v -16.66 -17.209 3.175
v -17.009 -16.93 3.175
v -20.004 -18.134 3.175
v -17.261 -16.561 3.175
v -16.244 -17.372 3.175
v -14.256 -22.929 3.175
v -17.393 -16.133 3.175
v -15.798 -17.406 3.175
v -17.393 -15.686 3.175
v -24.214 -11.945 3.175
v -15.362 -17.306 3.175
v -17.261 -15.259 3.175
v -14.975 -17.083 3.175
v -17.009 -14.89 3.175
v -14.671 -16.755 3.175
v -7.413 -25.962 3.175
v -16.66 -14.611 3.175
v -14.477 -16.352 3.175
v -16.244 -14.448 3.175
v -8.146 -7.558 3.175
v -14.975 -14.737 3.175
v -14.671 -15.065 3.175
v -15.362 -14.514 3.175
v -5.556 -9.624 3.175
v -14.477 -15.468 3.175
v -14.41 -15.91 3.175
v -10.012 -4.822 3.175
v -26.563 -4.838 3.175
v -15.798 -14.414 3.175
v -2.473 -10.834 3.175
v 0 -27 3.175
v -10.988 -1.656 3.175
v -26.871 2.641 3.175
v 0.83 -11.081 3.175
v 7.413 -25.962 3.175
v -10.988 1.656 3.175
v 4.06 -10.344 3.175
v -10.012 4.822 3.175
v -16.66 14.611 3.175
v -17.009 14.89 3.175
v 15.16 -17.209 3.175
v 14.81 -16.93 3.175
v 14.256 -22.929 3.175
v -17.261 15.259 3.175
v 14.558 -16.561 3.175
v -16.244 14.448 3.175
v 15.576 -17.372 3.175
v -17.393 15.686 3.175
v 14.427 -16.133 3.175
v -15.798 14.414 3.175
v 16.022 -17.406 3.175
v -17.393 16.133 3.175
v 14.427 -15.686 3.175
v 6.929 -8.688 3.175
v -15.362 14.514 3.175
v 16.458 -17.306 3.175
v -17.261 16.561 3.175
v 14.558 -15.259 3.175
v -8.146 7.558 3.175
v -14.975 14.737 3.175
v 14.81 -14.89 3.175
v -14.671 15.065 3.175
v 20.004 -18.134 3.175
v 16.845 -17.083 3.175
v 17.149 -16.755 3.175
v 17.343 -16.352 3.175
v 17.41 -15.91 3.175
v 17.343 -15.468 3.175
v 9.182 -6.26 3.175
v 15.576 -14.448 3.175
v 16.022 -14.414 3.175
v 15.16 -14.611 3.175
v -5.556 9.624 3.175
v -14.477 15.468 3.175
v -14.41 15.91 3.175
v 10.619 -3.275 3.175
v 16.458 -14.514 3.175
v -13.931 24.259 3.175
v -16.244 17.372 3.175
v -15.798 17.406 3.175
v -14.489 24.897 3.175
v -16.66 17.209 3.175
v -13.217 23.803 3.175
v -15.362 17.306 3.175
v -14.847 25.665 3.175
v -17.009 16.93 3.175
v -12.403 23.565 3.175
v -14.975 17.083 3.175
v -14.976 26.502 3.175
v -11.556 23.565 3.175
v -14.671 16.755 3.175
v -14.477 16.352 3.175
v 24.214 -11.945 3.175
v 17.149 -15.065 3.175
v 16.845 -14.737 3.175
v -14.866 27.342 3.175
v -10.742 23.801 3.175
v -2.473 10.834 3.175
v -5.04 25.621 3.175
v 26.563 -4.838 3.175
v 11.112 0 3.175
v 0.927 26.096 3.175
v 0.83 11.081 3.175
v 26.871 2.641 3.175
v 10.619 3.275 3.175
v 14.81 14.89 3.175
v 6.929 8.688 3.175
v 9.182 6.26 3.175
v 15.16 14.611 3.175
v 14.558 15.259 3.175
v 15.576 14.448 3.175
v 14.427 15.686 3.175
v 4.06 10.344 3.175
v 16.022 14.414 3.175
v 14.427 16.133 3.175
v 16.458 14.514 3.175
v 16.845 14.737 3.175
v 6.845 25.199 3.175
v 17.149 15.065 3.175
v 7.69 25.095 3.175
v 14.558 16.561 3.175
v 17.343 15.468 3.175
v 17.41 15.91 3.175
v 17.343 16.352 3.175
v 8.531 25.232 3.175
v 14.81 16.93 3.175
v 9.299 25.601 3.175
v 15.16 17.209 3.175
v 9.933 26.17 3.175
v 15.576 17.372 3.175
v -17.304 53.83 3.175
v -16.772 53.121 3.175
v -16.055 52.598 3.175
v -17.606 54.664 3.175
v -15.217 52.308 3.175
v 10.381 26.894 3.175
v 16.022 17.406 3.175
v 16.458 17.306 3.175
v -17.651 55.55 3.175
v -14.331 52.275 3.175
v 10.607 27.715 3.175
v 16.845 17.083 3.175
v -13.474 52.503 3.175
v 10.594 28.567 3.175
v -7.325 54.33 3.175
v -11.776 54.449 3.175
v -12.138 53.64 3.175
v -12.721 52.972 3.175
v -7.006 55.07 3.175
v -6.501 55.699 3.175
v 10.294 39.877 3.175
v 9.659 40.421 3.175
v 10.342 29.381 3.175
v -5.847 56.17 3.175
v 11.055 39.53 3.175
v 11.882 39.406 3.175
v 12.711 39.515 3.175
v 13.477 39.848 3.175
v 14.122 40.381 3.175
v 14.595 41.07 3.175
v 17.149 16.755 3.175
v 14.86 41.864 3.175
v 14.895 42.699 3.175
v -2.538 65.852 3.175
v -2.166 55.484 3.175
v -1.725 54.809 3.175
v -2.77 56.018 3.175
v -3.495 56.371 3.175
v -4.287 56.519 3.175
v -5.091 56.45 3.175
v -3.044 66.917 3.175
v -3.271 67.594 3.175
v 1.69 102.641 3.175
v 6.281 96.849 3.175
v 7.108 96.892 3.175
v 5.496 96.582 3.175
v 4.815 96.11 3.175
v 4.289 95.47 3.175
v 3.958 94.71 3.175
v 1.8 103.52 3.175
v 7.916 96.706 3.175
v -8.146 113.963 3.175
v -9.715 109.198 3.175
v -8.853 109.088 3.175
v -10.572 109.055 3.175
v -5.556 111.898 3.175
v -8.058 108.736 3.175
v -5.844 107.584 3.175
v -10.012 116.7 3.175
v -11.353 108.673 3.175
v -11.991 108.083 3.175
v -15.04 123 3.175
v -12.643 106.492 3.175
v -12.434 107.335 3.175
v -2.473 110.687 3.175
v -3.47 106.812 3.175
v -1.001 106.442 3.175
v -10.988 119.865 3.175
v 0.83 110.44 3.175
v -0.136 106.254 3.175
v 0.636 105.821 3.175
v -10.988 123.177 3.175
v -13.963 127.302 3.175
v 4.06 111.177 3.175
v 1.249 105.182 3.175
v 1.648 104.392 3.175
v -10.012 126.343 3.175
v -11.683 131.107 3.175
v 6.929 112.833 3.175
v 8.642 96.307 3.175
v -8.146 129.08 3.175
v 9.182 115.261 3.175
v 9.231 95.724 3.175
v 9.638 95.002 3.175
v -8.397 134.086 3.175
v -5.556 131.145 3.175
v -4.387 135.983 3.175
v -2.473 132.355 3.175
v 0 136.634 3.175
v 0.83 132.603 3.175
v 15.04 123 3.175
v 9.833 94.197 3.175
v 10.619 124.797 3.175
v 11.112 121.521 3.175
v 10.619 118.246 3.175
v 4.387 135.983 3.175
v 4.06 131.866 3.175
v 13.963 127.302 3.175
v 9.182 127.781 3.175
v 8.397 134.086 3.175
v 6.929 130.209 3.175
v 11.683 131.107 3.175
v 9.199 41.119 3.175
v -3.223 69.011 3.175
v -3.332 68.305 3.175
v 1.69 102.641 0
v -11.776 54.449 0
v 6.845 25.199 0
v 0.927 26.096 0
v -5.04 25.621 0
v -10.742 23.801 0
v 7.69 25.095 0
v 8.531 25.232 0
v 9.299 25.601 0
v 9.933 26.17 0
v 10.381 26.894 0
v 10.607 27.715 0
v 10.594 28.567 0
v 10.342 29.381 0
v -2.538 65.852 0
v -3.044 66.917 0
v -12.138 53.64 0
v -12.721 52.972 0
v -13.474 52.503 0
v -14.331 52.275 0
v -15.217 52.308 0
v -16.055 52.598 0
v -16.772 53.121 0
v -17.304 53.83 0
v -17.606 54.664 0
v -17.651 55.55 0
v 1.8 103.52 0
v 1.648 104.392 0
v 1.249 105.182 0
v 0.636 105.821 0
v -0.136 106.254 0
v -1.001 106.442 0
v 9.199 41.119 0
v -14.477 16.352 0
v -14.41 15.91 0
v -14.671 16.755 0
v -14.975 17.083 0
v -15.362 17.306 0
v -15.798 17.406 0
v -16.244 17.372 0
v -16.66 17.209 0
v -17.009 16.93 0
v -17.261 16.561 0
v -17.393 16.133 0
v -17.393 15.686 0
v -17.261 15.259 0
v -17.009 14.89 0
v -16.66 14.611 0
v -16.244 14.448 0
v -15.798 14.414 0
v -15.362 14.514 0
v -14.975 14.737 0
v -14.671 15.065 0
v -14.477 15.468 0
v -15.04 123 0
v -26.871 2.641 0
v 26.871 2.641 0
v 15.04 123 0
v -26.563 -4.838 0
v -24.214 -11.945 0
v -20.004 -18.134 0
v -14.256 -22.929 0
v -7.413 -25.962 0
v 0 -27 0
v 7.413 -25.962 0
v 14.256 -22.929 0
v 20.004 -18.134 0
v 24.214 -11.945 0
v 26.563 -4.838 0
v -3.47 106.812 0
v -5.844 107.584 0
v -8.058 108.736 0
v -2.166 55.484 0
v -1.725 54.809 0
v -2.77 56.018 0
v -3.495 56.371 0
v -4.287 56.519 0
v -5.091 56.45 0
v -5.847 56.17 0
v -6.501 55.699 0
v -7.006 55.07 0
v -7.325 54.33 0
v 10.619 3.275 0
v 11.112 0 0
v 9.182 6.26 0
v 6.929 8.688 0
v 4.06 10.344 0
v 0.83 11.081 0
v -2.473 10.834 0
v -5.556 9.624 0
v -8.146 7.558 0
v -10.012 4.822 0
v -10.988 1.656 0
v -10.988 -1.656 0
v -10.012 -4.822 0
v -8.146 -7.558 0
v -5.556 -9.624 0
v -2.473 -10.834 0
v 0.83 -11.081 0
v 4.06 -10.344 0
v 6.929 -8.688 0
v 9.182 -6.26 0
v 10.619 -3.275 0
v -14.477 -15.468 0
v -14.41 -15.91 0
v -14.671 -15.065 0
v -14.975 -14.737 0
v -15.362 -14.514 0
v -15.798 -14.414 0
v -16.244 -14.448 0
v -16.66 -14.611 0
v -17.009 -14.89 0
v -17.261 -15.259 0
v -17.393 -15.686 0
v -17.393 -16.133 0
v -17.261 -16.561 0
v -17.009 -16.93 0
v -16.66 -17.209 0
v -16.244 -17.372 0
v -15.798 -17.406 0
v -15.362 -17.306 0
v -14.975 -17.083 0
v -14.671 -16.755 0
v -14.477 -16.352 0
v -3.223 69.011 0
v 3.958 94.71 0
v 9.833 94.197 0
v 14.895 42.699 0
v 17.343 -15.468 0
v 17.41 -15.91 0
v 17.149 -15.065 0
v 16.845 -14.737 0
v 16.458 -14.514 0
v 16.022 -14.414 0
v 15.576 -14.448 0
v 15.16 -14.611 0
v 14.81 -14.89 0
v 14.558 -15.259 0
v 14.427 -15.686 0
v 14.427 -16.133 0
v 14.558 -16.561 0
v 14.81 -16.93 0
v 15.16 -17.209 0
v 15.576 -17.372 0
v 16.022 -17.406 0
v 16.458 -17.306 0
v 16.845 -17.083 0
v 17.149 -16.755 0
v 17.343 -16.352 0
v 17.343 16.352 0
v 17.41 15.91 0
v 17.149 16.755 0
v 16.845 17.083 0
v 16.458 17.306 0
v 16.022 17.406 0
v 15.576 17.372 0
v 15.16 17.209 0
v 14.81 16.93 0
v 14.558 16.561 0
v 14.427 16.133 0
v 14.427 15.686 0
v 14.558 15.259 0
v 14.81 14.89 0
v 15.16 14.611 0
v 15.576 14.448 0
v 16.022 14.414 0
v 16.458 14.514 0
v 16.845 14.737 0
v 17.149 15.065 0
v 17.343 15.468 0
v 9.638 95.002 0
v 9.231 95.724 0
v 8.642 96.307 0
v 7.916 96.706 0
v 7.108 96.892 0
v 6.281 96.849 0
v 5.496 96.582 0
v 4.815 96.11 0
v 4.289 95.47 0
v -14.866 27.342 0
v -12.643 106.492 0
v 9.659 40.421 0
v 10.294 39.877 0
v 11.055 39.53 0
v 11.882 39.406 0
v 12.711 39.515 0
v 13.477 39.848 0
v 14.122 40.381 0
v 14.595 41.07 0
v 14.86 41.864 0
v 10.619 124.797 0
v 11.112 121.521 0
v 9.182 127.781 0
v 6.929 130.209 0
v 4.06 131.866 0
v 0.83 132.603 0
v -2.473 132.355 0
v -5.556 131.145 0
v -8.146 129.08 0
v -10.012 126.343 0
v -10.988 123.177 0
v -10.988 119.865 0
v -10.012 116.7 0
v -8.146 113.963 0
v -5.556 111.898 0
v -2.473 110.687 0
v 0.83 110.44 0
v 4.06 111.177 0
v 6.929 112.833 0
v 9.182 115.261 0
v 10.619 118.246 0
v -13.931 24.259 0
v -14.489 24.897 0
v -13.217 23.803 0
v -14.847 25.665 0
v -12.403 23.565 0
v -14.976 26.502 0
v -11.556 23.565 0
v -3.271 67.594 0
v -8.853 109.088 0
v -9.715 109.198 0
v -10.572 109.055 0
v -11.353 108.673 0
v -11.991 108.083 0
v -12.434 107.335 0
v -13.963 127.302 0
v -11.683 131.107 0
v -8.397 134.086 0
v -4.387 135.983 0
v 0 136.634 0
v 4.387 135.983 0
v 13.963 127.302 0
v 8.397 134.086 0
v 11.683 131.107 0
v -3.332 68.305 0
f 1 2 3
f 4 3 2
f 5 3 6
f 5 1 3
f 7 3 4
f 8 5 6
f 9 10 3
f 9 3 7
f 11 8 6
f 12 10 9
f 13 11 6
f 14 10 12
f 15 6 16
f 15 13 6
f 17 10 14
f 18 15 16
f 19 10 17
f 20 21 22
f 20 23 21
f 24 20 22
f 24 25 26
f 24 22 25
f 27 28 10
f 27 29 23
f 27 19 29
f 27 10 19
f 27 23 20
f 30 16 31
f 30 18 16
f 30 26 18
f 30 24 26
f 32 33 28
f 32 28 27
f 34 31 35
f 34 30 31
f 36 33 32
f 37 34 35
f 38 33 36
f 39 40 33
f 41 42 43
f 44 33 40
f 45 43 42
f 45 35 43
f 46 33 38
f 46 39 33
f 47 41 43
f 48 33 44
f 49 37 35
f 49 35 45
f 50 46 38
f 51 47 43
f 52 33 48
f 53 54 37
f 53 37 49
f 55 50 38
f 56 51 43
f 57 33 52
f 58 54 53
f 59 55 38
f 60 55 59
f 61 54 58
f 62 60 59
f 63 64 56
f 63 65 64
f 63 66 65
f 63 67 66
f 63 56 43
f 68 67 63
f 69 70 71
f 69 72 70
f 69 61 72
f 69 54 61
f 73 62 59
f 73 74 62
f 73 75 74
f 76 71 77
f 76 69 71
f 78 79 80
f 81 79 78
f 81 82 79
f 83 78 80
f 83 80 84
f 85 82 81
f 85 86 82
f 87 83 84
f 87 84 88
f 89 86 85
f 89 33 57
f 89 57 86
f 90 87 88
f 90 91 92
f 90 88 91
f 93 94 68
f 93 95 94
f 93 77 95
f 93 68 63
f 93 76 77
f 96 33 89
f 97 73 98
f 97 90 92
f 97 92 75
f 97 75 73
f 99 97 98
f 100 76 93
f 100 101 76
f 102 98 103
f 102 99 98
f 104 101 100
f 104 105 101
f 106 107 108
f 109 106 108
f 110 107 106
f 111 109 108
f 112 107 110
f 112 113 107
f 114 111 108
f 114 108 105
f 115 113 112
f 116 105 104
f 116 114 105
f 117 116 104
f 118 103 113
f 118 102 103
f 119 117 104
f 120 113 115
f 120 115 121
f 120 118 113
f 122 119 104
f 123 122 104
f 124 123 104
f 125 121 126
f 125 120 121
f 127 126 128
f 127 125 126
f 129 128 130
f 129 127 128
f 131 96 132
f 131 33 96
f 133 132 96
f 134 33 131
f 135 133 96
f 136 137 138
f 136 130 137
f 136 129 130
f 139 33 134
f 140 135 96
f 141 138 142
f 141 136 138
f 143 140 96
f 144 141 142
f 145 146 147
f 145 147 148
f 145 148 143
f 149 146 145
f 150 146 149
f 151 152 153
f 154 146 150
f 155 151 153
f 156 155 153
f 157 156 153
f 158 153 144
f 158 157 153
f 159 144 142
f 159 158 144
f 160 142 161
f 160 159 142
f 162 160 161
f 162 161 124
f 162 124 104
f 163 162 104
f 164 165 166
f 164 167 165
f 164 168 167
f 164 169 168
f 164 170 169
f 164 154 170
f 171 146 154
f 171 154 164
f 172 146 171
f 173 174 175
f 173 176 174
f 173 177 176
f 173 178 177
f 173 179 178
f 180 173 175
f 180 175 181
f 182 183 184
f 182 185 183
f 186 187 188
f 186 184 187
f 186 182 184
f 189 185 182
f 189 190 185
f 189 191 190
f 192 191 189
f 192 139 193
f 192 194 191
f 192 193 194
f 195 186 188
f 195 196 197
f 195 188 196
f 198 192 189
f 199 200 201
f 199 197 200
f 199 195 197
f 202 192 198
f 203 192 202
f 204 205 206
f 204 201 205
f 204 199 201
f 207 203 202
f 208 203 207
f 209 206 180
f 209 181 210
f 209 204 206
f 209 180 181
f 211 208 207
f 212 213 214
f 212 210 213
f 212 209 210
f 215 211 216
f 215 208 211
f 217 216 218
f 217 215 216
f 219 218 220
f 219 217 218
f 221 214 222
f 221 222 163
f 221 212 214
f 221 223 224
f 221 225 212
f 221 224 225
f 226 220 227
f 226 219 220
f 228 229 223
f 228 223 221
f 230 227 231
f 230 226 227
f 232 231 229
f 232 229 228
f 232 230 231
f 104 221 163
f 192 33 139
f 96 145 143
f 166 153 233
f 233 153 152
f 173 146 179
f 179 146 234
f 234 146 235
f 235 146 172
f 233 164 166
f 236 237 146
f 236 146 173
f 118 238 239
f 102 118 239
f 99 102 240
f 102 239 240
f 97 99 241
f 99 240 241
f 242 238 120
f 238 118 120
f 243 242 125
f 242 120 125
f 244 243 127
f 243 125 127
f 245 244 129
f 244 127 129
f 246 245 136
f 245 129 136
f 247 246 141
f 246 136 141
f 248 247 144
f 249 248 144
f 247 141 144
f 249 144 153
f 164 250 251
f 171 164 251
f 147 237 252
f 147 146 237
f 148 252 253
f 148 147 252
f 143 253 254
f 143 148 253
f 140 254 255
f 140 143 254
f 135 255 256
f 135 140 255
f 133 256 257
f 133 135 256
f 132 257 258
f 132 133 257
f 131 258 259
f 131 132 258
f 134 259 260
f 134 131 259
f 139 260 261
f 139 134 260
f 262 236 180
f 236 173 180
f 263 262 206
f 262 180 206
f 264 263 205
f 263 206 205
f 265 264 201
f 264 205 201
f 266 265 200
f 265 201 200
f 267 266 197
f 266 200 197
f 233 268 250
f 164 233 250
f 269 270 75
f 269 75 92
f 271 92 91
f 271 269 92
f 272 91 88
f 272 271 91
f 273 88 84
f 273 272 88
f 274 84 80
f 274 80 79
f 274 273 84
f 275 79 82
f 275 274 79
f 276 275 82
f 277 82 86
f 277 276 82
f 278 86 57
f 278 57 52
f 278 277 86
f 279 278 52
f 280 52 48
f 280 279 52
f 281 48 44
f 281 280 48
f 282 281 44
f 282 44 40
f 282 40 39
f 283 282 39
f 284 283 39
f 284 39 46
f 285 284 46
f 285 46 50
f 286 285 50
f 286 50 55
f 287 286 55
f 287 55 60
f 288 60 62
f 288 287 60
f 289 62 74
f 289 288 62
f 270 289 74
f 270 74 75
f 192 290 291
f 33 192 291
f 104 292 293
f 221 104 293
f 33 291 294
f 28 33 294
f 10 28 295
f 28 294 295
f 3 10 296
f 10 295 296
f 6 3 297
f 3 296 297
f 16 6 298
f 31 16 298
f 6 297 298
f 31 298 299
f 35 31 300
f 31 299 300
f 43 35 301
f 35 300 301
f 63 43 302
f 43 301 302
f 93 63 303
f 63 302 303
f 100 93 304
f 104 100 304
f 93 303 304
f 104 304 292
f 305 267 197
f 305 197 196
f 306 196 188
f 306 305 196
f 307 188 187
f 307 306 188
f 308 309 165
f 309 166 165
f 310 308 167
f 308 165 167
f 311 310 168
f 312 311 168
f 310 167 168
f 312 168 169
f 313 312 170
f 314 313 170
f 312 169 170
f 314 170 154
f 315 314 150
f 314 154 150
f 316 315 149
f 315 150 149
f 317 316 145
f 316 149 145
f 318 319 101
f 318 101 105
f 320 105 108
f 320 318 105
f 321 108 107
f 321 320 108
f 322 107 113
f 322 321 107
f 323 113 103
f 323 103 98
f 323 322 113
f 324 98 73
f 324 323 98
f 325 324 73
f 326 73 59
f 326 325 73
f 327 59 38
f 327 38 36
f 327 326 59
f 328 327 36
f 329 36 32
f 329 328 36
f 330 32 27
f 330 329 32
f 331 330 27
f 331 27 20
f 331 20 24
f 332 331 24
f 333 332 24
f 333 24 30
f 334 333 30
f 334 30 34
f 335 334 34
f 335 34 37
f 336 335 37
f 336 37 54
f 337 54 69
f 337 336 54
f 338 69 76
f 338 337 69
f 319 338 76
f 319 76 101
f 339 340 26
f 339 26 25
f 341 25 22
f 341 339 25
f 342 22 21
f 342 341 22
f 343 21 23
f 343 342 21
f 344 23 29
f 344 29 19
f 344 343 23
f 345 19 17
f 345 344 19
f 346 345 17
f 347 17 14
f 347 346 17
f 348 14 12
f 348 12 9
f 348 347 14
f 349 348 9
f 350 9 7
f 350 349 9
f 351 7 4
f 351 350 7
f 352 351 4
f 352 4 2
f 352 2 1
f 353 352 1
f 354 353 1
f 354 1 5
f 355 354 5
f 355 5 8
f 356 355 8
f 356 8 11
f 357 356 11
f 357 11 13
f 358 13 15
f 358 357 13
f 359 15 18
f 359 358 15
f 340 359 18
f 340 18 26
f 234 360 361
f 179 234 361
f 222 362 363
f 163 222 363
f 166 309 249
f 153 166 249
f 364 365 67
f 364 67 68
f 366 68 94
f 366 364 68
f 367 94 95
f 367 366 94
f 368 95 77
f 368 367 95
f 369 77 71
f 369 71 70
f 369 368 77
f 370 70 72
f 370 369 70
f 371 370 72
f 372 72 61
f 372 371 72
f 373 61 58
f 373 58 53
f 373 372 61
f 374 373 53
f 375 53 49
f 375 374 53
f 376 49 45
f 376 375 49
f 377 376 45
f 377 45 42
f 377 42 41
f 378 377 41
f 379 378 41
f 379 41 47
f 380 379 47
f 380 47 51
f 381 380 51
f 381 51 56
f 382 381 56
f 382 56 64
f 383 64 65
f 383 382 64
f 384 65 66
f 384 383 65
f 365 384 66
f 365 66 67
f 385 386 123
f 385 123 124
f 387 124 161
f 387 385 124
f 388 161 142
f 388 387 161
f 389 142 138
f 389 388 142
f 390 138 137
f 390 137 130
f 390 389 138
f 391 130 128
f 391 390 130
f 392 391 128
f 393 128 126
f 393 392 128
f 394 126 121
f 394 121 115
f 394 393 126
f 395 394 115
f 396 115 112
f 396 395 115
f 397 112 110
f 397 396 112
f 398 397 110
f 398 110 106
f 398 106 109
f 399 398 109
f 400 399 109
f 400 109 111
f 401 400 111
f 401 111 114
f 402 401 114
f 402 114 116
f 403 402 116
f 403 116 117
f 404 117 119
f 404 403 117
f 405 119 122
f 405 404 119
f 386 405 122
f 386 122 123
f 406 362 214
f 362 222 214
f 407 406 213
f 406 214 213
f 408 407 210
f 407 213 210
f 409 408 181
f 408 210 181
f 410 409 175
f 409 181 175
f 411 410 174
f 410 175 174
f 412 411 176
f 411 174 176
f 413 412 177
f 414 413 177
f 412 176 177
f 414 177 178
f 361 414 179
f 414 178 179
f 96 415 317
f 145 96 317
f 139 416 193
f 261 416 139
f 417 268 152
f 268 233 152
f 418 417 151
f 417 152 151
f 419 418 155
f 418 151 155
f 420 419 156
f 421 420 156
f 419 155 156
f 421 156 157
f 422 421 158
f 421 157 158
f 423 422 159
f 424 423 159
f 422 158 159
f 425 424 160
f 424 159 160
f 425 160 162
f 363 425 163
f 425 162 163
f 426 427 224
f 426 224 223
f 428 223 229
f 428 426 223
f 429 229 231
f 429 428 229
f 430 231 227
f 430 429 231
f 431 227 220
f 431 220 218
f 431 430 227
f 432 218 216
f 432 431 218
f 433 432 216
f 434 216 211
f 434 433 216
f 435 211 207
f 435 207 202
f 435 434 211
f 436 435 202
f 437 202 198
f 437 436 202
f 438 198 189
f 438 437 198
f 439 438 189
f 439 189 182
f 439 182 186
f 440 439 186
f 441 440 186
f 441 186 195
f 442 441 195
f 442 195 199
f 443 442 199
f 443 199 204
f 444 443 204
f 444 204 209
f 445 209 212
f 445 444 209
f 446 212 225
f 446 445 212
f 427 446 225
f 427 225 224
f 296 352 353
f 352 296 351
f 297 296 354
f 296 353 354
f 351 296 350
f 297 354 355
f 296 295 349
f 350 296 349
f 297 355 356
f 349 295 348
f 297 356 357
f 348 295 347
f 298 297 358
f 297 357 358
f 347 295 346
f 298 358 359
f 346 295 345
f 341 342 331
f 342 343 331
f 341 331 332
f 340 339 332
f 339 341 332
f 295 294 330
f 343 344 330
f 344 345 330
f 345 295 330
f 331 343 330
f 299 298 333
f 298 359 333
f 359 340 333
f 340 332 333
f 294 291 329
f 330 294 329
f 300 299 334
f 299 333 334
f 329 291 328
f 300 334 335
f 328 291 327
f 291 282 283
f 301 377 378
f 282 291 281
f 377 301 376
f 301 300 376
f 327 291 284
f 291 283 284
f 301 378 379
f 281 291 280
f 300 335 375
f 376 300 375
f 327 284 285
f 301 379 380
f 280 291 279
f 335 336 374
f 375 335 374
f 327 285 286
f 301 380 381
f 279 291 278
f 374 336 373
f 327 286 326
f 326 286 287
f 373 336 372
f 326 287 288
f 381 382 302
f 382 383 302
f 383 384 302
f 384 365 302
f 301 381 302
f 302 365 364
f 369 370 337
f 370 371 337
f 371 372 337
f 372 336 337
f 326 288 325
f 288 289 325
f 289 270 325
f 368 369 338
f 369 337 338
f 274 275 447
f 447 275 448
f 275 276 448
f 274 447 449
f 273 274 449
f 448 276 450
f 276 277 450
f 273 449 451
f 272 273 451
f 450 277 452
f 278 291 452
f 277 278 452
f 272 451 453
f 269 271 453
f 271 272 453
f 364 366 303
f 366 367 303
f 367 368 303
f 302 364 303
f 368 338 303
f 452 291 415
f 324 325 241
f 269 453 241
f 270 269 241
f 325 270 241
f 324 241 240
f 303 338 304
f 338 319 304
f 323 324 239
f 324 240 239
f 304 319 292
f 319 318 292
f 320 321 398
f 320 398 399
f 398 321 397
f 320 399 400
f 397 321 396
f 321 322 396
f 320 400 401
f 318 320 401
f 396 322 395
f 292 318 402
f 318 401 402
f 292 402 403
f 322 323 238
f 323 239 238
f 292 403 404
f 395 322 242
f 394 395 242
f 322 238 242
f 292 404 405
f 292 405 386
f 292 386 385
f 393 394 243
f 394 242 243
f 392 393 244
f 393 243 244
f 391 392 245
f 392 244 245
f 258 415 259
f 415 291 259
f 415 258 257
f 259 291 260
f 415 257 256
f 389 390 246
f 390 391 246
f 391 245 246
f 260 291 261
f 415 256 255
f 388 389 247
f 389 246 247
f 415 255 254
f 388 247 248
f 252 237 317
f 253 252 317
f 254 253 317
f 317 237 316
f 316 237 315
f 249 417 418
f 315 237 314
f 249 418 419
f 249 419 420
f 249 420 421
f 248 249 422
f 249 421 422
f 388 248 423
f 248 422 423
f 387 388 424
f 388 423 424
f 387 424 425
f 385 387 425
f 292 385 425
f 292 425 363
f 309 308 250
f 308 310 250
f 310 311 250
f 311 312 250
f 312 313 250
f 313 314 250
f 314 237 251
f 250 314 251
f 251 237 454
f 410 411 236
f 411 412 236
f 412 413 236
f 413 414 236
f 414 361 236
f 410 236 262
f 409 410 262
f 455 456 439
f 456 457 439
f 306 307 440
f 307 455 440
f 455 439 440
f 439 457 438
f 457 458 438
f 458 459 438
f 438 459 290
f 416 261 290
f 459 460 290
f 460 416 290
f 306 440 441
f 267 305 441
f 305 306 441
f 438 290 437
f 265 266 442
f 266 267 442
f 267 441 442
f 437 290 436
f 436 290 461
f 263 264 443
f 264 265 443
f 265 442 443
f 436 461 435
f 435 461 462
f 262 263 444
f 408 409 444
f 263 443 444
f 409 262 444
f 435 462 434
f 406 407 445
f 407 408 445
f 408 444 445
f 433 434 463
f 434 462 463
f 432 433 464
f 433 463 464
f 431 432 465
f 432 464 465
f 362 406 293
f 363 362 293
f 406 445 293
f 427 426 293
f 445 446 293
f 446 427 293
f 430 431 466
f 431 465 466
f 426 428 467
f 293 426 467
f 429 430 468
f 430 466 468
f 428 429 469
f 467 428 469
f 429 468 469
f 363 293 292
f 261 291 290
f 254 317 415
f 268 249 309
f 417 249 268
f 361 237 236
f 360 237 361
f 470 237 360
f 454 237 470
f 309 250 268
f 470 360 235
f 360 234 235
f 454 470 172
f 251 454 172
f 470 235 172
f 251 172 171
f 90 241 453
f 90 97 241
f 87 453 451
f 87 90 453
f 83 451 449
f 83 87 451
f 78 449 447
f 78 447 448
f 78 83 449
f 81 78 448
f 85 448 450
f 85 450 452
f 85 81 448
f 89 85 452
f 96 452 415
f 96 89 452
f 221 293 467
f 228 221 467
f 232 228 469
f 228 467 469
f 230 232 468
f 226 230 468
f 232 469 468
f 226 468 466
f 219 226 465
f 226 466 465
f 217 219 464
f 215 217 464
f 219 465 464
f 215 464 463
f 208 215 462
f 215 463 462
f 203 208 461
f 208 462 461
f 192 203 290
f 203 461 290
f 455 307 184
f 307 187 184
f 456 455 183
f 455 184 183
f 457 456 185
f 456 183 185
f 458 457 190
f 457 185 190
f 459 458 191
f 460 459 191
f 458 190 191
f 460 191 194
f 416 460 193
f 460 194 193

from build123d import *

# Parameters (mm, degrees)
SKETCH1_R           = 27
SKETCH1_R_2         = 11.1125
SKETCH1_R_3         = 1.5
SKETCH1_R_4         = 15.1125
BOSS_EXTRUDE1_DEPTH = 3.175
CUT_EXTRUDE1_DEPTH  = 3.175
FILLET1_R           = 3


with BuildPart() as part:
    # Sketch1 → Boss-Extrude1 (new body)
    with BuildSketch(Plane.XY):
        Circle(SKETCH1_R)
        Circle(SKETCH1_R_2, mode=Mode.SUBTRACT)
        with Locations((15.909902577, 15.909902577)):
            Circle(SKETCH1_R_3, mode=Mode.SUBTRACT)
        with Locations((15.909902577, -15.909902577)):
            Circle(SKETCH1_R_3, mode=Mode.SUBTRACT)
        with Locations((-15.909902577, -15.909902577)):
            Circle(SKETCH1_R_3, mode=Mode.SUBTRACT)
        with Locations((-15.909902577, 15.909902577)):
            Circle(SKETCH1_R_3, mode=Mode.SUBTRACT)
        with BuildLine():
            ThreePointArc((15.1125, 121.52122), (-0.740058556, 106.426851196), (-15.040018721, 122.999561344))
            Line((-15.040018721, 122.999561344), (-26.87050491, 2.64120538))
            ThreePointArc((-26.87050491, 2.64120538), (0, 27), (26.87050491, 2.64120538))
            Line((26.87050491, 2.64120538), (15.040018721, 122.999561344))
            ThreePointArc((15.040018721, 122.999561344), (15.094368804, 122.261278556), (15.1125, 121.52122))
        make_face()
        with Locations((0, 121.52122)):
            Circle(SKETCH1_R_4)
        with Locations((0, 121.52122)):
            Circle(SKETCH1_R_2, mode=Mode.SUBTRACT)
    extrude(amount=BOSS_EXTRUDE1_DEPTH)

    # Sketch2 → Cut-Extrude1 (cut)
    with BuildSketch(Plane(origin=(0, 0, 0), x_dir=(-1, 0, 0), z_dir=(0, 0, -1))):
        with BuildLine():
            Line((21.005906623, 21.414723514), (-2.816362401, 106.673467339))
            ThreePointArc((-2.816362401, 106.673467339), (5.441374418, 107.422315763), (12.061107277, 112.415323695))
            Line((12.061107277, 112.415323695), (21.005906623, 21.414723514))
        make_face()
        Polygon((2.538490153, 65.851704894), (3.524956455, 67.930383746), (-8.266368844, 110.130964305), (-16.578304393, 25.568852363), align=None)
        with BuildLine():
            Line((16.957069467, 19.857503654), (5.165744168, 62.058084212))
            Line((5.165744168, 62.058084212), (-13.749853367, 22.199193423))
            ThreePointArc((-13.749853367, 22.199193423), (1.98555698, 26.036901116), (16.957069467, 19.857503654))
        make_face()
    extrude(amount=-CUT_EXTRUDE1_DEPTH, mode=Mode.SUBTRACT)

    # Fillet1
    fillet1_edges = [part.edges().sort_by_distance(p)[0] for p in [
        (2.816362401, 106.673467339, 1.5875),
        (-12.061107277, 112.415323695, 1.5875),
        (-21.005906623, 21.414723514, 1.5875),
        (8.266368844, 110.130964305, 1.5875),
        (-3.524956455, 67.930383746, 1.5875),
        (16.578304393, 25.568852363, 1.5875),
        (13.749853367, 22.199193423, 1.5875),
        (-5.165744168, 62.058084212, 1.5875),
        (-16.957069467, 19.857503654, 1.5875),
    ]]
    fillet(fillet1_edges, radius=FILLET1_R)


solid = part.part
